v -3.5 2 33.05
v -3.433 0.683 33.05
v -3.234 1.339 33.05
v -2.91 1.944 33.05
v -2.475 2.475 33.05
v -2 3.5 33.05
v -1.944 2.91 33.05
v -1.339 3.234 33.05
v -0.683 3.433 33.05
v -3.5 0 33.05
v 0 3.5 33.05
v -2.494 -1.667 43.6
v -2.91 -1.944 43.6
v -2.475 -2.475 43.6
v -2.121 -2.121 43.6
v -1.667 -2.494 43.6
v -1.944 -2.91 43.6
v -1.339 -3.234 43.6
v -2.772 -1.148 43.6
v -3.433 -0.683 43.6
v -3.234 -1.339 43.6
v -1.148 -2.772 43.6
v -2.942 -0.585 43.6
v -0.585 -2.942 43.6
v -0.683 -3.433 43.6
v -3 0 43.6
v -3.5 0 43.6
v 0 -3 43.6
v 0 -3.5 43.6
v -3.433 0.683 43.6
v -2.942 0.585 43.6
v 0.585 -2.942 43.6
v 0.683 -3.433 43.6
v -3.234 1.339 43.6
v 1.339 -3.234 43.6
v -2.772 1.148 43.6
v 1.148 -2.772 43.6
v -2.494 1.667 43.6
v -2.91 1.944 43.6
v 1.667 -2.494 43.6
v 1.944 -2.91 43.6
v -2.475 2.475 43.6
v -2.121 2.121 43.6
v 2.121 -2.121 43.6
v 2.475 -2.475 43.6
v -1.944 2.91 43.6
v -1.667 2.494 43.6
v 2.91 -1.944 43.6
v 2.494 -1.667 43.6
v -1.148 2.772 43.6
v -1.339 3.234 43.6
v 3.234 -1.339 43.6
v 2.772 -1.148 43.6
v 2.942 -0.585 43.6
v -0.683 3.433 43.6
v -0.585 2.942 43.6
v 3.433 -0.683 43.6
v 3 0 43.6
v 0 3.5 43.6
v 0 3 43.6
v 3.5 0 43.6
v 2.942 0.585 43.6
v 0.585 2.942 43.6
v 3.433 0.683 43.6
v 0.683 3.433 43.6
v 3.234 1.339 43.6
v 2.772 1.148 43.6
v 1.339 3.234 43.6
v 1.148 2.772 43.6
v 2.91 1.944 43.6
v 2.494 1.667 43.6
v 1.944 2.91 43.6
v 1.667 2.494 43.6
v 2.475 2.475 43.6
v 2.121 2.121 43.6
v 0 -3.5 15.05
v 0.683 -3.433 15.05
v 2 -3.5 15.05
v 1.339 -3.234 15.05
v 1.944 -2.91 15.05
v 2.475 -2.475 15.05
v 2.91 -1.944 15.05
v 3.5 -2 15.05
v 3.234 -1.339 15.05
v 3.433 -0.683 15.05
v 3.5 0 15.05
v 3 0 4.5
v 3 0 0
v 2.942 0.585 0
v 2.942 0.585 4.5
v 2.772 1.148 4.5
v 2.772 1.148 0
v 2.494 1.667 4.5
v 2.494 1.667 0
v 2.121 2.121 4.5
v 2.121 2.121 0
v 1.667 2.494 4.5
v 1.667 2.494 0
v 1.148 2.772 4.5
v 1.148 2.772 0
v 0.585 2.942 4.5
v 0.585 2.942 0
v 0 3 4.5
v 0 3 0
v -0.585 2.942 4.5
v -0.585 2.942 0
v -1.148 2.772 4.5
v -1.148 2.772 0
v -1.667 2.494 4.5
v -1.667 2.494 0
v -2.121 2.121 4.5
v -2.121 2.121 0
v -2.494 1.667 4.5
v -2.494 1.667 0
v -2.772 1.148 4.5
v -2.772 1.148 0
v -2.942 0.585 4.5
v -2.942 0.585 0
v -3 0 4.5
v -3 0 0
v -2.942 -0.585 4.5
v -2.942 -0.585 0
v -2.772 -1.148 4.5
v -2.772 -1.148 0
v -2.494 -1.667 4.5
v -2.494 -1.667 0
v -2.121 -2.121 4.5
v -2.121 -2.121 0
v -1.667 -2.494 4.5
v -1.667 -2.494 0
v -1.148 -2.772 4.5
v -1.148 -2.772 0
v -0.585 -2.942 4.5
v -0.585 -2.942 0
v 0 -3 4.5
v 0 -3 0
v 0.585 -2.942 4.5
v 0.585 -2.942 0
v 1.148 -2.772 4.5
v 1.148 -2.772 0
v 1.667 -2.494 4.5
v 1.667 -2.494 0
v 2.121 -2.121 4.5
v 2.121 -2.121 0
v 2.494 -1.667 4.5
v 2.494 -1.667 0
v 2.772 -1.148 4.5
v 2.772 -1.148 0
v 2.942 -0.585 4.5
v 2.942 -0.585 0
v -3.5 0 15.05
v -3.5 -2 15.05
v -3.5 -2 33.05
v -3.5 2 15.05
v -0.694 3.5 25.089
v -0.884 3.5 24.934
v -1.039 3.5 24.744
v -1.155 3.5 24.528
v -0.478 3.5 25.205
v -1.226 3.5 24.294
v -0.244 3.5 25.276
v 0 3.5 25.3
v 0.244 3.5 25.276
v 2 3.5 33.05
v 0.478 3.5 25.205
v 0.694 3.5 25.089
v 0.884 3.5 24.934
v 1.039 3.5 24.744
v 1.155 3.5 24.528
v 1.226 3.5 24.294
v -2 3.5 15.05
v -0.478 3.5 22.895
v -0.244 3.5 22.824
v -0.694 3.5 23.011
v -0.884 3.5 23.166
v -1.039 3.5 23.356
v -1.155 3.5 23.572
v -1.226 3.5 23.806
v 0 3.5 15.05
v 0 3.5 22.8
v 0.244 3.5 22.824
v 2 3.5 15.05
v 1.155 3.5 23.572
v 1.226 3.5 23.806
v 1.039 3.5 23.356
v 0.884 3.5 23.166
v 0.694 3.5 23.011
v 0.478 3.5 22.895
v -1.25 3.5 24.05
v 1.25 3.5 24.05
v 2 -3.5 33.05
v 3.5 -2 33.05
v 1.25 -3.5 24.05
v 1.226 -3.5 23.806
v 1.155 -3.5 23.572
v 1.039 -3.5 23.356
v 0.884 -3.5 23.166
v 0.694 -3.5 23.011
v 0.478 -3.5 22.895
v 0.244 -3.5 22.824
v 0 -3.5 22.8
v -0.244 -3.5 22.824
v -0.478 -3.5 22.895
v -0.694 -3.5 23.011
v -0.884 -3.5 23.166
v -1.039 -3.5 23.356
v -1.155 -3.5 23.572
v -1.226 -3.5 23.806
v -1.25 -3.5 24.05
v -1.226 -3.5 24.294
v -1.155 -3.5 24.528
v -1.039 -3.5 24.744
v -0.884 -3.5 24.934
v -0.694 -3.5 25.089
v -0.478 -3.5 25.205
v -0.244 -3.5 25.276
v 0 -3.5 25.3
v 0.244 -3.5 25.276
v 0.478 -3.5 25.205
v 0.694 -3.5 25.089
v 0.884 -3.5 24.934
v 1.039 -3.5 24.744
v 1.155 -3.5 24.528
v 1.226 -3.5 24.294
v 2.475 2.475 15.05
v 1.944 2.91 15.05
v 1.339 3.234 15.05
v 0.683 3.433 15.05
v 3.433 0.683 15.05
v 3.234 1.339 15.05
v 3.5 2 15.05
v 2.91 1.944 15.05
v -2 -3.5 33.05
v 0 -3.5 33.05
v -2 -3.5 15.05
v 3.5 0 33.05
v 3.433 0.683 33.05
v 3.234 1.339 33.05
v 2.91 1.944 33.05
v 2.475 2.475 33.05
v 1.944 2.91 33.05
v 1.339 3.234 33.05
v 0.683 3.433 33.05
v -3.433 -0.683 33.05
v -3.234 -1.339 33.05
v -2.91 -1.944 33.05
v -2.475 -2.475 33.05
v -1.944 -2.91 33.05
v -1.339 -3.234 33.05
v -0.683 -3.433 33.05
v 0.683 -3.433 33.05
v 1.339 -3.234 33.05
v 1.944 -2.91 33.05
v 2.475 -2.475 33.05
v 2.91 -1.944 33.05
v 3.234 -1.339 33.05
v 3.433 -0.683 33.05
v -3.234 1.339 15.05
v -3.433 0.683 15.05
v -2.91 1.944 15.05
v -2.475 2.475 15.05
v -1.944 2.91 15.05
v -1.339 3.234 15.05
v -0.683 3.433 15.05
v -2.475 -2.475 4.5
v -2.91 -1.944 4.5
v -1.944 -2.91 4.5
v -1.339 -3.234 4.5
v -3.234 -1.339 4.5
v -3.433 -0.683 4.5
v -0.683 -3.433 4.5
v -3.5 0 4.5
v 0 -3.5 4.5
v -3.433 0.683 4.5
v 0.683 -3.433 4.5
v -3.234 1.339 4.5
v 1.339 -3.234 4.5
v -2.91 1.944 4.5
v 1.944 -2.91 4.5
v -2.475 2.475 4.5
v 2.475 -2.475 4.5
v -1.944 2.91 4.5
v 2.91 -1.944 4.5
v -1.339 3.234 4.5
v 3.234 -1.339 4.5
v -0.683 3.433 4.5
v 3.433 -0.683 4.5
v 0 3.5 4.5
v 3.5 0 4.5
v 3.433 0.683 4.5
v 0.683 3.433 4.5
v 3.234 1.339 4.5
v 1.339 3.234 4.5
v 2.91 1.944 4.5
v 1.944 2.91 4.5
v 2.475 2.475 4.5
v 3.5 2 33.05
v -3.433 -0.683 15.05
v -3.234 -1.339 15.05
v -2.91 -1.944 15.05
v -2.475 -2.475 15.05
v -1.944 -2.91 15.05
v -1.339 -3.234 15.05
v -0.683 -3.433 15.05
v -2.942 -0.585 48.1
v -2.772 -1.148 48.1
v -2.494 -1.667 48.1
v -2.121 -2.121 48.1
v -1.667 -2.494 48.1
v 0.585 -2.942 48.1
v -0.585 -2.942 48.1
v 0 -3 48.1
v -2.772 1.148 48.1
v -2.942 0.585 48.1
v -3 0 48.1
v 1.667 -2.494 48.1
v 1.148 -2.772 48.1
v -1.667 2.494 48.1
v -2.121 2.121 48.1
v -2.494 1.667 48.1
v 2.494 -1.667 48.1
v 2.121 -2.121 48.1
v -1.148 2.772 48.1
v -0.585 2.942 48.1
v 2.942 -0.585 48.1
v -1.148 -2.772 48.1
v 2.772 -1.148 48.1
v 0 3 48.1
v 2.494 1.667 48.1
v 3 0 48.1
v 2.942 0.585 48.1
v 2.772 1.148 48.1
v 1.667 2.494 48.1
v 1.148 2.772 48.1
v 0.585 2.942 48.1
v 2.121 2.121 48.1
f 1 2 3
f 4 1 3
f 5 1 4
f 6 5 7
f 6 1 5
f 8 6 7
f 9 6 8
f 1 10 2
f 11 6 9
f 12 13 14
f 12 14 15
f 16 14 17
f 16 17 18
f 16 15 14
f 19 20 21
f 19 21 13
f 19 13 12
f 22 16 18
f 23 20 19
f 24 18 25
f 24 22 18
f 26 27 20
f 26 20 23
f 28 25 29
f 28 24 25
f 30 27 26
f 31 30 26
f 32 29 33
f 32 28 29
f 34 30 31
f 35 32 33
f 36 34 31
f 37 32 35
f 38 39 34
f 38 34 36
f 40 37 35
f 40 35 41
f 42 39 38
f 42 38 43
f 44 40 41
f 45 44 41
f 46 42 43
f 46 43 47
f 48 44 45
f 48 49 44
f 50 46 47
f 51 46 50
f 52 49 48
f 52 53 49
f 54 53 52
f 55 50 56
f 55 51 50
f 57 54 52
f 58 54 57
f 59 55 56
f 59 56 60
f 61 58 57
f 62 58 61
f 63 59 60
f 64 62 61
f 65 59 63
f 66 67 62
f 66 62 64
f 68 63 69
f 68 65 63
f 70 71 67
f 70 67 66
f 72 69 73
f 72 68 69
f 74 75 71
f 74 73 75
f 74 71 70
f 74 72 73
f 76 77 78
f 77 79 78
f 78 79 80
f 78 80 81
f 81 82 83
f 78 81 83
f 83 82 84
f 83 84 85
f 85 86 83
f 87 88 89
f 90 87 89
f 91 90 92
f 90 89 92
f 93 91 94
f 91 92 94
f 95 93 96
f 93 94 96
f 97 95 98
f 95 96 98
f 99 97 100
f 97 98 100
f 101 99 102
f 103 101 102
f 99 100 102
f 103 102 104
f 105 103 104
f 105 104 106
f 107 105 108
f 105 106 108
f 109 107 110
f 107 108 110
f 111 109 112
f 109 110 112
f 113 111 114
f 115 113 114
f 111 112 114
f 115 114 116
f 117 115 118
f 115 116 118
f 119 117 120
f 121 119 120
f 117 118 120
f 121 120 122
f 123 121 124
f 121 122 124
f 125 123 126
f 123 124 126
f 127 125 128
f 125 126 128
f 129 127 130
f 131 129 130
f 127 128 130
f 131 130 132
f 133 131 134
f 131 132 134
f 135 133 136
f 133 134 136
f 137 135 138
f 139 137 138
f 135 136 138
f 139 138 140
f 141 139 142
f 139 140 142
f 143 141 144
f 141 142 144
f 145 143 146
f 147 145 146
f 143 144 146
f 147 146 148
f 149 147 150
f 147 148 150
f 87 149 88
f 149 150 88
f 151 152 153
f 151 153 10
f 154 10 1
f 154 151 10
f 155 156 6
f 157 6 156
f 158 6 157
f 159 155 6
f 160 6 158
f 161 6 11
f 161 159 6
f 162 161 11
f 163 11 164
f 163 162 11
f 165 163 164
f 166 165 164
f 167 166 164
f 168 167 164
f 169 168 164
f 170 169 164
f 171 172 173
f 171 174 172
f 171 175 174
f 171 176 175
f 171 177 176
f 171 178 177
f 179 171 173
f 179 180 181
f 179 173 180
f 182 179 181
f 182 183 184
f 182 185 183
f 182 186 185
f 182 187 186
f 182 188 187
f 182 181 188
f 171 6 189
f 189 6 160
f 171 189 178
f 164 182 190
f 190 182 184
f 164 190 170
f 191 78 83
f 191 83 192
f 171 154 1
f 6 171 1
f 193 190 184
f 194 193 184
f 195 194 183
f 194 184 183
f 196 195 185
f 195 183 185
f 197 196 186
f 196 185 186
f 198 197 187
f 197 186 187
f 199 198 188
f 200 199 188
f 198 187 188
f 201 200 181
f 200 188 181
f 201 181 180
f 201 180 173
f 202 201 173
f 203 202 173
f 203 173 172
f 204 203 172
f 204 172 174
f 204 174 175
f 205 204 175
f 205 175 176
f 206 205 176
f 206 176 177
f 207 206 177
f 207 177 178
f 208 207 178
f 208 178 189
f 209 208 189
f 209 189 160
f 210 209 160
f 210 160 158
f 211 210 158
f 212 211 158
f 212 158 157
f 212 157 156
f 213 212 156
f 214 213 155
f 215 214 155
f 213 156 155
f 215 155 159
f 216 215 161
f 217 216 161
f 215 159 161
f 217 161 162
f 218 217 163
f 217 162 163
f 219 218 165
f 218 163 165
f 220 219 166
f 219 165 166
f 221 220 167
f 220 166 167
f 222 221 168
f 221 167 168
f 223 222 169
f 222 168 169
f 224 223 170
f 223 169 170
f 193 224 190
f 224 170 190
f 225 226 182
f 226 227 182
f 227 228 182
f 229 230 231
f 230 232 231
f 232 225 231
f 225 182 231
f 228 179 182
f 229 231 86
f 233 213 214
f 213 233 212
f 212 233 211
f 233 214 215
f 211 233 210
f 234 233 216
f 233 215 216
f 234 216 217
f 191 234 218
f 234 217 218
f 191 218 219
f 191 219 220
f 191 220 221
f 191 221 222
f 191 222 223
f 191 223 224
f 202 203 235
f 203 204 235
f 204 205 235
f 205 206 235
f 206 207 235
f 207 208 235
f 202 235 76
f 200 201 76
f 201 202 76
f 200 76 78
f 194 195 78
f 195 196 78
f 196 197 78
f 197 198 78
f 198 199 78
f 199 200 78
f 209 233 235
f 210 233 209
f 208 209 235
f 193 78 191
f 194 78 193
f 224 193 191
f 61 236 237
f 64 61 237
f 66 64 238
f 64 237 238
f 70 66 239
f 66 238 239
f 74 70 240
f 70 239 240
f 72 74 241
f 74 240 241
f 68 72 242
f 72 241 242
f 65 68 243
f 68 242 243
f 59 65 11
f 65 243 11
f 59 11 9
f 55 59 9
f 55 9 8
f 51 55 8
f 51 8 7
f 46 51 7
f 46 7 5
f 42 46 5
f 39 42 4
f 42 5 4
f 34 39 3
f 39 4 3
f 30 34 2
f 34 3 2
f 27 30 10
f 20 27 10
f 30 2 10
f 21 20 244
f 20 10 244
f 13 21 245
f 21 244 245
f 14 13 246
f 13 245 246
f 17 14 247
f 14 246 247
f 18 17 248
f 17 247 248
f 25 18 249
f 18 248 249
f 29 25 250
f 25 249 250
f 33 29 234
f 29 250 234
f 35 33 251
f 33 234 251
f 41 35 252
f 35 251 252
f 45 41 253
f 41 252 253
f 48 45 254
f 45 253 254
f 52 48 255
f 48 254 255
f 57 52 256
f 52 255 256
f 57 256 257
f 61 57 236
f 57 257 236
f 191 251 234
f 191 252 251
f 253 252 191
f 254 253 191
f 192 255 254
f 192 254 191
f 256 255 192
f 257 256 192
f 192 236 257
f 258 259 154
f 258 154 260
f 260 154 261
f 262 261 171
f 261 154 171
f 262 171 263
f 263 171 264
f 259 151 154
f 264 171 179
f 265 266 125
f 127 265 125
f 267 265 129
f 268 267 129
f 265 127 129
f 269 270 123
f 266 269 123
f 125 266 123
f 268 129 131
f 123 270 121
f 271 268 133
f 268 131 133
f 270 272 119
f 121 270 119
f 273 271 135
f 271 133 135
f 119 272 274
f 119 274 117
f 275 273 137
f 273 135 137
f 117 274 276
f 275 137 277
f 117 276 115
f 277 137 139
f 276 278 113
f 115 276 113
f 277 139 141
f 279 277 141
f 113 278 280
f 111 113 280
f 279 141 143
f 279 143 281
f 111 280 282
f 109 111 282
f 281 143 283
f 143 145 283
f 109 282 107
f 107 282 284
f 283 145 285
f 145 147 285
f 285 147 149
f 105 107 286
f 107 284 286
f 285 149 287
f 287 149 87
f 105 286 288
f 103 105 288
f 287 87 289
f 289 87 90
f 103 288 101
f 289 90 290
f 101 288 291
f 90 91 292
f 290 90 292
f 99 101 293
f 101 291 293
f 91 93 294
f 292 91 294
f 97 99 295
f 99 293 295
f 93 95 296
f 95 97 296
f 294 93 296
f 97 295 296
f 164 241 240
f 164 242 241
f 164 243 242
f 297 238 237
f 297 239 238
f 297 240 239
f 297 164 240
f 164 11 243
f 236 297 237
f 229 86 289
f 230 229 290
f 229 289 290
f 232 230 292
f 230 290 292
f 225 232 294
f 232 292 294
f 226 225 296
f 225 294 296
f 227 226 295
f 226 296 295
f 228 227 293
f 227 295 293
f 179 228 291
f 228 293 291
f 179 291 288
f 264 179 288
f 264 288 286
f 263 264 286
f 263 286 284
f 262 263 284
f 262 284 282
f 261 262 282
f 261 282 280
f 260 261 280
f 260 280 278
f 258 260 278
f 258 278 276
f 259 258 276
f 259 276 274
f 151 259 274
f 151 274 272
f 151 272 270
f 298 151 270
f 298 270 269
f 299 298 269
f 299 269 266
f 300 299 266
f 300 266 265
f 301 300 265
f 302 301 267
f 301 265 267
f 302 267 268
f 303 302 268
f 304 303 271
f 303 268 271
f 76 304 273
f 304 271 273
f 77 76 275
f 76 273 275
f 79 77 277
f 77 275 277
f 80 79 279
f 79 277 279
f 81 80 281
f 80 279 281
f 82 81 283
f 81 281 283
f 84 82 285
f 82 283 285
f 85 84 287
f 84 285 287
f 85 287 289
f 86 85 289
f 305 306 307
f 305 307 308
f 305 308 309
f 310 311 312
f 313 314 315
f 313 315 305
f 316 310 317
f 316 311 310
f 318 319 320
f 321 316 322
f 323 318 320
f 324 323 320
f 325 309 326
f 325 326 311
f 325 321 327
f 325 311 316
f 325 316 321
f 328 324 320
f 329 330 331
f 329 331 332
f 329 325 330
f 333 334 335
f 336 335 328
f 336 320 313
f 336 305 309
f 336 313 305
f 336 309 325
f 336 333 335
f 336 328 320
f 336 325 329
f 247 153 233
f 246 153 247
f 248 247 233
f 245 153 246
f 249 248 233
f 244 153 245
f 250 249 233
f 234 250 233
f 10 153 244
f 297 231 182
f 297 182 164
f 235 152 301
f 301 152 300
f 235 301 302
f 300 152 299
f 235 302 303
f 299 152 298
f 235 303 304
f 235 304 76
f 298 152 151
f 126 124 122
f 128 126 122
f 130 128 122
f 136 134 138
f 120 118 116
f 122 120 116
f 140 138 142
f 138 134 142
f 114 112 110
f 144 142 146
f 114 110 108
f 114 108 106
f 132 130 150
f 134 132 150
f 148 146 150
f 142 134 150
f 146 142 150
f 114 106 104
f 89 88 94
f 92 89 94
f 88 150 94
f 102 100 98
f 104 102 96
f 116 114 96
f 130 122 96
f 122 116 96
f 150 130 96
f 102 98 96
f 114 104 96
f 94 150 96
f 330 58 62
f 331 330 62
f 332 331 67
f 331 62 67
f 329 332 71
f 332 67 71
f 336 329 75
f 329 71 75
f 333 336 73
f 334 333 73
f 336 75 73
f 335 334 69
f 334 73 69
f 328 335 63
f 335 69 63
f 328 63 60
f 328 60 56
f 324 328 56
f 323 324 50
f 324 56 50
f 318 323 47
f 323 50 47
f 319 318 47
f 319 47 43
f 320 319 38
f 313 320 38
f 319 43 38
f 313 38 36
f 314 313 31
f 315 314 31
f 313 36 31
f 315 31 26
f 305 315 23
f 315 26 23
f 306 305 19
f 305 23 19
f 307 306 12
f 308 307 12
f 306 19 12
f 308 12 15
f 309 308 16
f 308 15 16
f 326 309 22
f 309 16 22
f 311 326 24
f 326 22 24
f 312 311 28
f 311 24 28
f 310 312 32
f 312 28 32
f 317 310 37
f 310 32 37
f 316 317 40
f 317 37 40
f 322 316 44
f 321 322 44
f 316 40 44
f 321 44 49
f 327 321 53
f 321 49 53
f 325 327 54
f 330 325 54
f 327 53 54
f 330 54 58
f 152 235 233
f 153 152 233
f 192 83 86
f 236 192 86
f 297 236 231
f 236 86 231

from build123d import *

# Parameters (mm, degrees)
CROQUIS1_R              = 3
SALIENTE_EXTRUIR1_DEPTH = 4.5
CROQUIS2_R              = 3.5
SALIENTE_EXTRUIR2_DEPTH = 10.55
CROQUIS3_W              = 7
CROQUIS3_H              = 7
SALIENTE_EXTRUIR3_DEPTH = 18
CROQUIS4_R              = 3.5
SALIENTE_EXTRUIR4_DEPTH = 10.55
CROQUIS5_R              = 3
SALIENTE_EXTRUIR5_DEPTH = 4.5
CROQUIS6_R              = 1.25
CORTAR_EXTRUIR1_DEPTH   = 8
CHAFL_N1_SIZE           = 1.5


with BuildPart() as part:
    # Croquis1 → Saliente-Extruir1 (new body)
    with BuildSketch(Plane.XY):
        Circle(CROQUIS1_R)
    extrude(amount=SALIENTE_EXTRUIR1_DEPTH)

    # Croquis2 → Saliente-Extruir2 (add)
    with BuildSketch(Plane.XY.offset(4.5)):
        Circle(CROQUIS2_R)
    extrude(amount=SALIENTE_EXTRUIR2_DEPTH)

    # Croquis3 → Saliente-Extruir3 (add)
    with BuildSketch(Plane.XY.offset(15.05)):
        Rectangle(CROQUIS3_W, CROQUIS3_H)
    extrude(amount=SALIENTE_EXTRUIR3_DEPTH)

    # Croquis4 → Saliente-Extruir4 (add)
    with BuildSketch(Plane.XY.offset(33.05)):
        Circle(CROQUIS4_R)
    extrude(amount=SALIENTE_EXTRUIR4_DEPTH)

    # Croquis5 → Saliente-Extruir5 (add)
    with BuildSketch(Plane.XY.offset(43.6)):
        Circle(CROQUIS5_R)
    extrude(amount=SALIENTE_EXTRUIR5_DEPTH)

    # Croquis6 → Cortar-Extruir1 (cut, through all)
    with BuildSketch(Plane(origin=(0, 3.5, 0), x_dir=(1, 0, 0), z_dir=(0, 1, 0))):
        with Locations((0, -24.05)):
            Circle(CROQUIS6_R)
    extrude(amount=-CORTAR_EXTRUIR1_DEPTH, mode=Mode.SUBTRACT)

    # Chaflán1
    chafl_n1_edges = [part.edges().sort_by_distance(p)[0] for p in [
        (3.5, -3.5, 24.05),
        (3.5, 3.5, 24.05),
        (-3.5, 3.5, 24.05),
        (-3.5, -3.5, 24.05),
    ]]
    chamfer(chafl_n1_edges, length=CHAFL_N1_SIZE)


solid = part.part
